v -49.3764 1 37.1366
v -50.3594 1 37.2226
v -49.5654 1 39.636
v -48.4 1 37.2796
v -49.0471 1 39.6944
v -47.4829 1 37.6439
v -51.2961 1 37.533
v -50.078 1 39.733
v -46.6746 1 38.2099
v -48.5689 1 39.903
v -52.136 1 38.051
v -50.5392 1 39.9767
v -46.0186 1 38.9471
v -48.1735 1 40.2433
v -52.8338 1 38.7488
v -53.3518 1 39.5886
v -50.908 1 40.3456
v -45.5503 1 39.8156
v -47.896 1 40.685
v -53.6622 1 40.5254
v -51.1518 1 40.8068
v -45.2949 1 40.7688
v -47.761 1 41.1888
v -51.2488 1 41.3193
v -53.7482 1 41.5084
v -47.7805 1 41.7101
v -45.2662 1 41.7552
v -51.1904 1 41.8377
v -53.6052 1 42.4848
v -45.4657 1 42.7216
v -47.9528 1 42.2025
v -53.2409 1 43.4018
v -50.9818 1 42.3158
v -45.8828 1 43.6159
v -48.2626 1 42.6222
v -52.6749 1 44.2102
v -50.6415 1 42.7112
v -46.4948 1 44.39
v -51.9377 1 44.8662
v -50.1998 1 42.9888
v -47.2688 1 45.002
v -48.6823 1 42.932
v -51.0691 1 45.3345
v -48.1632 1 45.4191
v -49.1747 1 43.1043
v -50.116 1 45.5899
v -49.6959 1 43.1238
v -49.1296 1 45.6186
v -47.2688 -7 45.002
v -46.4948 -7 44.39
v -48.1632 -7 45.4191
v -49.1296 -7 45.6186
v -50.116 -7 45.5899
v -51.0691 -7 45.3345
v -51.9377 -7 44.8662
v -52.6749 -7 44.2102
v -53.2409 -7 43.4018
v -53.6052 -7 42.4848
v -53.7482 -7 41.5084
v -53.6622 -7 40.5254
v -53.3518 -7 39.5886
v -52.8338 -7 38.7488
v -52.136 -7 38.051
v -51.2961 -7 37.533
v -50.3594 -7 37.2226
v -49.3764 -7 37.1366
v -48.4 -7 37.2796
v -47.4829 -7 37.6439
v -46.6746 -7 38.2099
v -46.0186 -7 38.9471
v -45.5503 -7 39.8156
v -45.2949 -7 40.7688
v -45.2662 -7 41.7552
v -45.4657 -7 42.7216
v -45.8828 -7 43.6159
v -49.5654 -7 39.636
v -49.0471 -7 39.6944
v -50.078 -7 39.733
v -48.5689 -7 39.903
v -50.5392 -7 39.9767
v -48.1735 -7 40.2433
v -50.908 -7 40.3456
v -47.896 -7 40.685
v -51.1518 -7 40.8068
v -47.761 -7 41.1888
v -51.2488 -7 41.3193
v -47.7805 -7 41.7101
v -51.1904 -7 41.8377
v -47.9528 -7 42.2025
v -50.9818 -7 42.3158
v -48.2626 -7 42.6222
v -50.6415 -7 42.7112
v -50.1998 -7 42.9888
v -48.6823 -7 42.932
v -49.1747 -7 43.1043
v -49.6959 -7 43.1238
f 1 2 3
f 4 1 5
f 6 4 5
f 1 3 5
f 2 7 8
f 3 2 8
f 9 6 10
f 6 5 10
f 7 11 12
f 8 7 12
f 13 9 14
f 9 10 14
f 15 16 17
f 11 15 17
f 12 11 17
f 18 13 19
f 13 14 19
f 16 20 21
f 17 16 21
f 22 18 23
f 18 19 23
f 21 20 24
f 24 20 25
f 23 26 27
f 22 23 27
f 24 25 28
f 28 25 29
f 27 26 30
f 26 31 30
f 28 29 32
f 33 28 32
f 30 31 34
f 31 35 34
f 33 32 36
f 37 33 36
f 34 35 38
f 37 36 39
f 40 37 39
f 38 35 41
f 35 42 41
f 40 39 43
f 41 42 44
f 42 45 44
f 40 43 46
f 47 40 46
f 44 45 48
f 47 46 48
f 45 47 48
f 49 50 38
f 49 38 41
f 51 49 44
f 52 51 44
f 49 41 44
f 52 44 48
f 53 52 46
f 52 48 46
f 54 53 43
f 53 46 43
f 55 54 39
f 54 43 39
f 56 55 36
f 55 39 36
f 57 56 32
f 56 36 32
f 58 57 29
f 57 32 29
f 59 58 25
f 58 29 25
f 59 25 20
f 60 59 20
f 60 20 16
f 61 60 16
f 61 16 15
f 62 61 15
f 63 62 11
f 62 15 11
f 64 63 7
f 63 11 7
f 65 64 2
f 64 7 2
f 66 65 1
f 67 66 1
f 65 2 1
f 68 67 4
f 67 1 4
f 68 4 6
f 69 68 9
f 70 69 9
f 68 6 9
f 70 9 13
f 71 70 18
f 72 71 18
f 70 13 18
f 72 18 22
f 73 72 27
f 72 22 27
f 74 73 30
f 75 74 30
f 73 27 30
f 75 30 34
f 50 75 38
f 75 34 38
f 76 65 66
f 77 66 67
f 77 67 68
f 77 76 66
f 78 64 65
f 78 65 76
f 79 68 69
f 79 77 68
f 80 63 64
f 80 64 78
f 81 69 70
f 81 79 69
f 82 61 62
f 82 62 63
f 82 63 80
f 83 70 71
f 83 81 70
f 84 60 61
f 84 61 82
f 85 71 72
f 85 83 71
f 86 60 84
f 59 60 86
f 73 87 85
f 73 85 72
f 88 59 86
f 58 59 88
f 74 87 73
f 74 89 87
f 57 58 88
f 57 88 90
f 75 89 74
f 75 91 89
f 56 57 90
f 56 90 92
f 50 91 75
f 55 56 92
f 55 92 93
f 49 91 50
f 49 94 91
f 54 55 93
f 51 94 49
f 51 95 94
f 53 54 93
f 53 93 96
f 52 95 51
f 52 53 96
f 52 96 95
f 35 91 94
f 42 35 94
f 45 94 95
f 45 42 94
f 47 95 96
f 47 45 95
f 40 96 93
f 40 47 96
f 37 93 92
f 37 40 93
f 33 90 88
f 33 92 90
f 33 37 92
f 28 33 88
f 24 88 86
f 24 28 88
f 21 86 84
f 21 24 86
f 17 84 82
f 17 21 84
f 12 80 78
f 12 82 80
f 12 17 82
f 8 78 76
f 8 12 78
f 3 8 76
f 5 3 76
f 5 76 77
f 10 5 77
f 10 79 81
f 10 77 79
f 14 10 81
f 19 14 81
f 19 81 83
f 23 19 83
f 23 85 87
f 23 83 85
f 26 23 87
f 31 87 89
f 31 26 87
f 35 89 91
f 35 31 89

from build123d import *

# Parameters (mm, degrees)
CYLINDER_R           = 1.75
CYLINDER_DEPTH       = 10
CYLINDER001_R        = 4.25
CYLINDER001_DEPTH    = 8
CLONE001_ROLL_ANGLE  = 90
CLONE001_PITCH_ANGLE = -45


with BuildPart() as spacer_hole_cylinder:
    # Cylinder → Cylinder (new body)
    with BuildSketch(Plane.XY.offset(-1)):
        Circle(CYLINDER_R)
    extrude(amount=CYLINDER_DEPTH)


with BuildPart() as x_motor_spacer_top:
    # Cylinder001 → Cylinder001 (new body)
    with BuildSketch(Plane.XY):
        Circle(CYLINDER001_R)
    extrude(amount=CYLINDER001_DEPTH)

    # Cut002: cut spacer-hole-cylinder
    add(spacer_hole_cylinder.part, mode=Mode.SUBTRACT)


with BuildPart() as x_motor_spacer_top_1:
    # Clone001 roll: moved
    add(x_motor_spacer_top.part.rotate(Axis((0, 0, 0), (1, 0, 0)), CLONE001_ROLL_ANGLE))


with BuildPart() as x_motor_spacer_top_2:
    # Clone001 pitch: moved
    add(x_motor_spacer_top_1.part.rotate(Axis((0, 0, 0), (0, 1, 0)), CLONE001_PITCH_ANGLE))


with BuildPart() as x_motor_spacer_top_3:
    # Clone001 placement: moved
    add(x_motor_spacer_top_2.part.moved(Location((-49.5, 1, 41.384776))))


solid = x_motor_spacer_top_3.part
